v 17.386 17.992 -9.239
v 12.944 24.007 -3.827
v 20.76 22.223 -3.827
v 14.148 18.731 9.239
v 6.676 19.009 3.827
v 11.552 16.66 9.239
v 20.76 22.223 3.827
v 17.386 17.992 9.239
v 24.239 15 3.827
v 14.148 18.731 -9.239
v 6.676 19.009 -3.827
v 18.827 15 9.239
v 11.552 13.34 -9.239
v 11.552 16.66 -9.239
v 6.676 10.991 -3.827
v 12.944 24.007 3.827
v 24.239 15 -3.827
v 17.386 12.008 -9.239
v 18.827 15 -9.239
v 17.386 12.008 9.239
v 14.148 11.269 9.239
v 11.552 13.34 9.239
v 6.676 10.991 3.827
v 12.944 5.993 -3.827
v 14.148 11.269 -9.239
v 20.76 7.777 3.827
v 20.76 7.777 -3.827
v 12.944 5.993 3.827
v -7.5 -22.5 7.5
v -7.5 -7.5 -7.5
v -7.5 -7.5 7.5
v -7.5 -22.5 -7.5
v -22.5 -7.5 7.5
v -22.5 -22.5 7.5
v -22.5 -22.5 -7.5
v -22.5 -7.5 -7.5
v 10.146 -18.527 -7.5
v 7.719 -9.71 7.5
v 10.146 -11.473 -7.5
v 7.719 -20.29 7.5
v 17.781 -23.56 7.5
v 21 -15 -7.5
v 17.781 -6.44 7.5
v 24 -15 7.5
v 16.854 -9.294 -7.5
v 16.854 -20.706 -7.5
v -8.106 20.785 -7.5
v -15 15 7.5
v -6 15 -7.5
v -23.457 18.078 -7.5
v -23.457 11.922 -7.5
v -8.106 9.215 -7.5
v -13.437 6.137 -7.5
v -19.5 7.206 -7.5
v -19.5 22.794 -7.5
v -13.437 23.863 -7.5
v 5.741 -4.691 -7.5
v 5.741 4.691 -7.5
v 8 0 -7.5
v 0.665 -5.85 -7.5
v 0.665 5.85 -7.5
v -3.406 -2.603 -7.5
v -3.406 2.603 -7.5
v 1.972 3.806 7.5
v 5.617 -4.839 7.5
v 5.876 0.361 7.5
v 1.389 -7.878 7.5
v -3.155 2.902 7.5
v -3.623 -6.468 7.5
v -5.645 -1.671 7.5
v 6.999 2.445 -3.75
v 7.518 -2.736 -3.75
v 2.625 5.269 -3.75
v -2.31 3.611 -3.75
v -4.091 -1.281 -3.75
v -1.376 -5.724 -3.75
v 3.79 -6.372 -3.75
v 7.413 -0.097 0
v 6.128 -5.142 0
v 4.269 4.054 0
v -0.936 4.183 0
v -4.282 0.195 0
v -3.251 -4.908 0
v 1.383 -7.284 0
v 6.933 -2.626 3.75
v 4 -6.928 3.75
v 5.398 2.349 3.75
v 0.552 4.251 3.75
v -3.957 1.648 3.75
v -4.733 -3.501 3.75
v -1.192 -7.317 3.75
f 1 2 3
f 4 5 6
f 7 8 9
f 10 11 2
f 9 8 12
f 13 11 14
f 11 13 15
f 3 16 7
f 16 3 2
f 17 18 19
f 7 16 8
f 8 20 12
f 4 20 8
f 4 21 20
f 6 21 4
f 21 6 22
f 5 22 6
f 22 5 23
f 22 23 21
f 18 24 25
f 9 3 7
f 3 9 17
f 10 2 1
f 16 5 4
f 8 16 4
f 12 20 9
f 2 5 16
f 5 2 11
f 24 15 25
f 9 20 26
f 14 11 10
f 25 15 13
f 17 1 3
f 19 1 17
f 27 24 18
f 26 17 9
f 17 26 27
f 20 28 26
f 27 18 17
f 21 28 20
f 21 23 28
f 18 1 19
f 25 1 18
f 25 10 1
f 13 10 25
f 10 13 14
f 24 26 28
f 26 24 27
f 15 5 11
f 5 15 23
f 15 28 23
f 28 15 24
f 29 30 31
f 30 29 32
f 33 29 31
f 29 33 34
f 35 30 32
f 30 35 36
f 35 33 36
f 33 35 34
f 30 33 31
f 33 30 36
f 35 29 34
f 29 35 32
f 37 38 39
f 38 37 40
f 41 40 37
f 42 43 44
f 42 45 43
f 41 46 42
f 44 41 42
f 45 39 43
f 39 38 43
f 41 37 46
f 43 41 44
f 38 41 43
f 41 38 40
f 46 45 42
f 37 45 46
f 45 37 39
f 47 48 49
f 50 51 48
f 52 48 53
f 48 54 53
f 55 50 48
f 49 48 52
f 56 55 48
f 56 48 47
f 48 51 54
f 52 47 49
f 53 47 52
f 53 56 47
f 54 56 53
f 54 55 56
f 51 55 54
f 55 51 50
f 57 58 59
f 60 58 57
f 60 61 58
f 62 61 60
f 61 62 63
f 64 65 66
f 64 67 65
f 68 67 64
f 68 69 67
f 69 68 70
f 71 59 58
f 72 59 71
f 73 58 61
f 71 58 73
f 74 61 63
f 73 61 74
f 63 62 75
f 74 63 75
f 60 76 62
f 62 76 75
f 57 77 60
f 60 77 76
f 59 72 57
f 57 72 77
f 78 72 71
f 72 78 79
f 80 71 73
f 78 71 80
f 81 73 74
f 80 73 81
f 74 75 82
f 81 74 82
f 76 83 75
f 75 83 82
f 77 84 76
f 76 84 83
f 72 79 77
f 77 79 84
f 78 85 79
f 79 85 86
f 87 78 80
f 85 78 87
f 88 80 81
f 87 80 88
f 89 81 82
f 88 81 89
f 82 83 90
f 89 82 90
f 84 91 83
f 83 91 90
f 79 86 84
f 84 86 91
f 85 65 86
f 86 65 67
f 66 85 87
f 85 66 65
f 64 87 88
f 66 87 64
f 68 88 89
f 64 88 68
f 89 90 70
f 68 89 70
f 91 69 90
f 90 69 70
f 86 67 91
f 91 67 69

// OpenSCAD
translate([+15, +15, 0])
    sphere(10, $fn=7);

translate([-15, -15, 0])
    cube(15, center=true);

translate([+15, -15, 0])
    cylinder(h = 15, d1 = 12, d2 = 18, $fn = 5, center = true);

translate([-15, +15, 0])
    cylinder(h = 15, d1 = 18, d2 = 0,  $fn = 9, center = true);

translate([  0,   0, 0])
    linear_extrude(height = 15, slices = 4, center=true, twist = 80)
        translate([2, 0, 0])
            circle(6, $fn = 7);
